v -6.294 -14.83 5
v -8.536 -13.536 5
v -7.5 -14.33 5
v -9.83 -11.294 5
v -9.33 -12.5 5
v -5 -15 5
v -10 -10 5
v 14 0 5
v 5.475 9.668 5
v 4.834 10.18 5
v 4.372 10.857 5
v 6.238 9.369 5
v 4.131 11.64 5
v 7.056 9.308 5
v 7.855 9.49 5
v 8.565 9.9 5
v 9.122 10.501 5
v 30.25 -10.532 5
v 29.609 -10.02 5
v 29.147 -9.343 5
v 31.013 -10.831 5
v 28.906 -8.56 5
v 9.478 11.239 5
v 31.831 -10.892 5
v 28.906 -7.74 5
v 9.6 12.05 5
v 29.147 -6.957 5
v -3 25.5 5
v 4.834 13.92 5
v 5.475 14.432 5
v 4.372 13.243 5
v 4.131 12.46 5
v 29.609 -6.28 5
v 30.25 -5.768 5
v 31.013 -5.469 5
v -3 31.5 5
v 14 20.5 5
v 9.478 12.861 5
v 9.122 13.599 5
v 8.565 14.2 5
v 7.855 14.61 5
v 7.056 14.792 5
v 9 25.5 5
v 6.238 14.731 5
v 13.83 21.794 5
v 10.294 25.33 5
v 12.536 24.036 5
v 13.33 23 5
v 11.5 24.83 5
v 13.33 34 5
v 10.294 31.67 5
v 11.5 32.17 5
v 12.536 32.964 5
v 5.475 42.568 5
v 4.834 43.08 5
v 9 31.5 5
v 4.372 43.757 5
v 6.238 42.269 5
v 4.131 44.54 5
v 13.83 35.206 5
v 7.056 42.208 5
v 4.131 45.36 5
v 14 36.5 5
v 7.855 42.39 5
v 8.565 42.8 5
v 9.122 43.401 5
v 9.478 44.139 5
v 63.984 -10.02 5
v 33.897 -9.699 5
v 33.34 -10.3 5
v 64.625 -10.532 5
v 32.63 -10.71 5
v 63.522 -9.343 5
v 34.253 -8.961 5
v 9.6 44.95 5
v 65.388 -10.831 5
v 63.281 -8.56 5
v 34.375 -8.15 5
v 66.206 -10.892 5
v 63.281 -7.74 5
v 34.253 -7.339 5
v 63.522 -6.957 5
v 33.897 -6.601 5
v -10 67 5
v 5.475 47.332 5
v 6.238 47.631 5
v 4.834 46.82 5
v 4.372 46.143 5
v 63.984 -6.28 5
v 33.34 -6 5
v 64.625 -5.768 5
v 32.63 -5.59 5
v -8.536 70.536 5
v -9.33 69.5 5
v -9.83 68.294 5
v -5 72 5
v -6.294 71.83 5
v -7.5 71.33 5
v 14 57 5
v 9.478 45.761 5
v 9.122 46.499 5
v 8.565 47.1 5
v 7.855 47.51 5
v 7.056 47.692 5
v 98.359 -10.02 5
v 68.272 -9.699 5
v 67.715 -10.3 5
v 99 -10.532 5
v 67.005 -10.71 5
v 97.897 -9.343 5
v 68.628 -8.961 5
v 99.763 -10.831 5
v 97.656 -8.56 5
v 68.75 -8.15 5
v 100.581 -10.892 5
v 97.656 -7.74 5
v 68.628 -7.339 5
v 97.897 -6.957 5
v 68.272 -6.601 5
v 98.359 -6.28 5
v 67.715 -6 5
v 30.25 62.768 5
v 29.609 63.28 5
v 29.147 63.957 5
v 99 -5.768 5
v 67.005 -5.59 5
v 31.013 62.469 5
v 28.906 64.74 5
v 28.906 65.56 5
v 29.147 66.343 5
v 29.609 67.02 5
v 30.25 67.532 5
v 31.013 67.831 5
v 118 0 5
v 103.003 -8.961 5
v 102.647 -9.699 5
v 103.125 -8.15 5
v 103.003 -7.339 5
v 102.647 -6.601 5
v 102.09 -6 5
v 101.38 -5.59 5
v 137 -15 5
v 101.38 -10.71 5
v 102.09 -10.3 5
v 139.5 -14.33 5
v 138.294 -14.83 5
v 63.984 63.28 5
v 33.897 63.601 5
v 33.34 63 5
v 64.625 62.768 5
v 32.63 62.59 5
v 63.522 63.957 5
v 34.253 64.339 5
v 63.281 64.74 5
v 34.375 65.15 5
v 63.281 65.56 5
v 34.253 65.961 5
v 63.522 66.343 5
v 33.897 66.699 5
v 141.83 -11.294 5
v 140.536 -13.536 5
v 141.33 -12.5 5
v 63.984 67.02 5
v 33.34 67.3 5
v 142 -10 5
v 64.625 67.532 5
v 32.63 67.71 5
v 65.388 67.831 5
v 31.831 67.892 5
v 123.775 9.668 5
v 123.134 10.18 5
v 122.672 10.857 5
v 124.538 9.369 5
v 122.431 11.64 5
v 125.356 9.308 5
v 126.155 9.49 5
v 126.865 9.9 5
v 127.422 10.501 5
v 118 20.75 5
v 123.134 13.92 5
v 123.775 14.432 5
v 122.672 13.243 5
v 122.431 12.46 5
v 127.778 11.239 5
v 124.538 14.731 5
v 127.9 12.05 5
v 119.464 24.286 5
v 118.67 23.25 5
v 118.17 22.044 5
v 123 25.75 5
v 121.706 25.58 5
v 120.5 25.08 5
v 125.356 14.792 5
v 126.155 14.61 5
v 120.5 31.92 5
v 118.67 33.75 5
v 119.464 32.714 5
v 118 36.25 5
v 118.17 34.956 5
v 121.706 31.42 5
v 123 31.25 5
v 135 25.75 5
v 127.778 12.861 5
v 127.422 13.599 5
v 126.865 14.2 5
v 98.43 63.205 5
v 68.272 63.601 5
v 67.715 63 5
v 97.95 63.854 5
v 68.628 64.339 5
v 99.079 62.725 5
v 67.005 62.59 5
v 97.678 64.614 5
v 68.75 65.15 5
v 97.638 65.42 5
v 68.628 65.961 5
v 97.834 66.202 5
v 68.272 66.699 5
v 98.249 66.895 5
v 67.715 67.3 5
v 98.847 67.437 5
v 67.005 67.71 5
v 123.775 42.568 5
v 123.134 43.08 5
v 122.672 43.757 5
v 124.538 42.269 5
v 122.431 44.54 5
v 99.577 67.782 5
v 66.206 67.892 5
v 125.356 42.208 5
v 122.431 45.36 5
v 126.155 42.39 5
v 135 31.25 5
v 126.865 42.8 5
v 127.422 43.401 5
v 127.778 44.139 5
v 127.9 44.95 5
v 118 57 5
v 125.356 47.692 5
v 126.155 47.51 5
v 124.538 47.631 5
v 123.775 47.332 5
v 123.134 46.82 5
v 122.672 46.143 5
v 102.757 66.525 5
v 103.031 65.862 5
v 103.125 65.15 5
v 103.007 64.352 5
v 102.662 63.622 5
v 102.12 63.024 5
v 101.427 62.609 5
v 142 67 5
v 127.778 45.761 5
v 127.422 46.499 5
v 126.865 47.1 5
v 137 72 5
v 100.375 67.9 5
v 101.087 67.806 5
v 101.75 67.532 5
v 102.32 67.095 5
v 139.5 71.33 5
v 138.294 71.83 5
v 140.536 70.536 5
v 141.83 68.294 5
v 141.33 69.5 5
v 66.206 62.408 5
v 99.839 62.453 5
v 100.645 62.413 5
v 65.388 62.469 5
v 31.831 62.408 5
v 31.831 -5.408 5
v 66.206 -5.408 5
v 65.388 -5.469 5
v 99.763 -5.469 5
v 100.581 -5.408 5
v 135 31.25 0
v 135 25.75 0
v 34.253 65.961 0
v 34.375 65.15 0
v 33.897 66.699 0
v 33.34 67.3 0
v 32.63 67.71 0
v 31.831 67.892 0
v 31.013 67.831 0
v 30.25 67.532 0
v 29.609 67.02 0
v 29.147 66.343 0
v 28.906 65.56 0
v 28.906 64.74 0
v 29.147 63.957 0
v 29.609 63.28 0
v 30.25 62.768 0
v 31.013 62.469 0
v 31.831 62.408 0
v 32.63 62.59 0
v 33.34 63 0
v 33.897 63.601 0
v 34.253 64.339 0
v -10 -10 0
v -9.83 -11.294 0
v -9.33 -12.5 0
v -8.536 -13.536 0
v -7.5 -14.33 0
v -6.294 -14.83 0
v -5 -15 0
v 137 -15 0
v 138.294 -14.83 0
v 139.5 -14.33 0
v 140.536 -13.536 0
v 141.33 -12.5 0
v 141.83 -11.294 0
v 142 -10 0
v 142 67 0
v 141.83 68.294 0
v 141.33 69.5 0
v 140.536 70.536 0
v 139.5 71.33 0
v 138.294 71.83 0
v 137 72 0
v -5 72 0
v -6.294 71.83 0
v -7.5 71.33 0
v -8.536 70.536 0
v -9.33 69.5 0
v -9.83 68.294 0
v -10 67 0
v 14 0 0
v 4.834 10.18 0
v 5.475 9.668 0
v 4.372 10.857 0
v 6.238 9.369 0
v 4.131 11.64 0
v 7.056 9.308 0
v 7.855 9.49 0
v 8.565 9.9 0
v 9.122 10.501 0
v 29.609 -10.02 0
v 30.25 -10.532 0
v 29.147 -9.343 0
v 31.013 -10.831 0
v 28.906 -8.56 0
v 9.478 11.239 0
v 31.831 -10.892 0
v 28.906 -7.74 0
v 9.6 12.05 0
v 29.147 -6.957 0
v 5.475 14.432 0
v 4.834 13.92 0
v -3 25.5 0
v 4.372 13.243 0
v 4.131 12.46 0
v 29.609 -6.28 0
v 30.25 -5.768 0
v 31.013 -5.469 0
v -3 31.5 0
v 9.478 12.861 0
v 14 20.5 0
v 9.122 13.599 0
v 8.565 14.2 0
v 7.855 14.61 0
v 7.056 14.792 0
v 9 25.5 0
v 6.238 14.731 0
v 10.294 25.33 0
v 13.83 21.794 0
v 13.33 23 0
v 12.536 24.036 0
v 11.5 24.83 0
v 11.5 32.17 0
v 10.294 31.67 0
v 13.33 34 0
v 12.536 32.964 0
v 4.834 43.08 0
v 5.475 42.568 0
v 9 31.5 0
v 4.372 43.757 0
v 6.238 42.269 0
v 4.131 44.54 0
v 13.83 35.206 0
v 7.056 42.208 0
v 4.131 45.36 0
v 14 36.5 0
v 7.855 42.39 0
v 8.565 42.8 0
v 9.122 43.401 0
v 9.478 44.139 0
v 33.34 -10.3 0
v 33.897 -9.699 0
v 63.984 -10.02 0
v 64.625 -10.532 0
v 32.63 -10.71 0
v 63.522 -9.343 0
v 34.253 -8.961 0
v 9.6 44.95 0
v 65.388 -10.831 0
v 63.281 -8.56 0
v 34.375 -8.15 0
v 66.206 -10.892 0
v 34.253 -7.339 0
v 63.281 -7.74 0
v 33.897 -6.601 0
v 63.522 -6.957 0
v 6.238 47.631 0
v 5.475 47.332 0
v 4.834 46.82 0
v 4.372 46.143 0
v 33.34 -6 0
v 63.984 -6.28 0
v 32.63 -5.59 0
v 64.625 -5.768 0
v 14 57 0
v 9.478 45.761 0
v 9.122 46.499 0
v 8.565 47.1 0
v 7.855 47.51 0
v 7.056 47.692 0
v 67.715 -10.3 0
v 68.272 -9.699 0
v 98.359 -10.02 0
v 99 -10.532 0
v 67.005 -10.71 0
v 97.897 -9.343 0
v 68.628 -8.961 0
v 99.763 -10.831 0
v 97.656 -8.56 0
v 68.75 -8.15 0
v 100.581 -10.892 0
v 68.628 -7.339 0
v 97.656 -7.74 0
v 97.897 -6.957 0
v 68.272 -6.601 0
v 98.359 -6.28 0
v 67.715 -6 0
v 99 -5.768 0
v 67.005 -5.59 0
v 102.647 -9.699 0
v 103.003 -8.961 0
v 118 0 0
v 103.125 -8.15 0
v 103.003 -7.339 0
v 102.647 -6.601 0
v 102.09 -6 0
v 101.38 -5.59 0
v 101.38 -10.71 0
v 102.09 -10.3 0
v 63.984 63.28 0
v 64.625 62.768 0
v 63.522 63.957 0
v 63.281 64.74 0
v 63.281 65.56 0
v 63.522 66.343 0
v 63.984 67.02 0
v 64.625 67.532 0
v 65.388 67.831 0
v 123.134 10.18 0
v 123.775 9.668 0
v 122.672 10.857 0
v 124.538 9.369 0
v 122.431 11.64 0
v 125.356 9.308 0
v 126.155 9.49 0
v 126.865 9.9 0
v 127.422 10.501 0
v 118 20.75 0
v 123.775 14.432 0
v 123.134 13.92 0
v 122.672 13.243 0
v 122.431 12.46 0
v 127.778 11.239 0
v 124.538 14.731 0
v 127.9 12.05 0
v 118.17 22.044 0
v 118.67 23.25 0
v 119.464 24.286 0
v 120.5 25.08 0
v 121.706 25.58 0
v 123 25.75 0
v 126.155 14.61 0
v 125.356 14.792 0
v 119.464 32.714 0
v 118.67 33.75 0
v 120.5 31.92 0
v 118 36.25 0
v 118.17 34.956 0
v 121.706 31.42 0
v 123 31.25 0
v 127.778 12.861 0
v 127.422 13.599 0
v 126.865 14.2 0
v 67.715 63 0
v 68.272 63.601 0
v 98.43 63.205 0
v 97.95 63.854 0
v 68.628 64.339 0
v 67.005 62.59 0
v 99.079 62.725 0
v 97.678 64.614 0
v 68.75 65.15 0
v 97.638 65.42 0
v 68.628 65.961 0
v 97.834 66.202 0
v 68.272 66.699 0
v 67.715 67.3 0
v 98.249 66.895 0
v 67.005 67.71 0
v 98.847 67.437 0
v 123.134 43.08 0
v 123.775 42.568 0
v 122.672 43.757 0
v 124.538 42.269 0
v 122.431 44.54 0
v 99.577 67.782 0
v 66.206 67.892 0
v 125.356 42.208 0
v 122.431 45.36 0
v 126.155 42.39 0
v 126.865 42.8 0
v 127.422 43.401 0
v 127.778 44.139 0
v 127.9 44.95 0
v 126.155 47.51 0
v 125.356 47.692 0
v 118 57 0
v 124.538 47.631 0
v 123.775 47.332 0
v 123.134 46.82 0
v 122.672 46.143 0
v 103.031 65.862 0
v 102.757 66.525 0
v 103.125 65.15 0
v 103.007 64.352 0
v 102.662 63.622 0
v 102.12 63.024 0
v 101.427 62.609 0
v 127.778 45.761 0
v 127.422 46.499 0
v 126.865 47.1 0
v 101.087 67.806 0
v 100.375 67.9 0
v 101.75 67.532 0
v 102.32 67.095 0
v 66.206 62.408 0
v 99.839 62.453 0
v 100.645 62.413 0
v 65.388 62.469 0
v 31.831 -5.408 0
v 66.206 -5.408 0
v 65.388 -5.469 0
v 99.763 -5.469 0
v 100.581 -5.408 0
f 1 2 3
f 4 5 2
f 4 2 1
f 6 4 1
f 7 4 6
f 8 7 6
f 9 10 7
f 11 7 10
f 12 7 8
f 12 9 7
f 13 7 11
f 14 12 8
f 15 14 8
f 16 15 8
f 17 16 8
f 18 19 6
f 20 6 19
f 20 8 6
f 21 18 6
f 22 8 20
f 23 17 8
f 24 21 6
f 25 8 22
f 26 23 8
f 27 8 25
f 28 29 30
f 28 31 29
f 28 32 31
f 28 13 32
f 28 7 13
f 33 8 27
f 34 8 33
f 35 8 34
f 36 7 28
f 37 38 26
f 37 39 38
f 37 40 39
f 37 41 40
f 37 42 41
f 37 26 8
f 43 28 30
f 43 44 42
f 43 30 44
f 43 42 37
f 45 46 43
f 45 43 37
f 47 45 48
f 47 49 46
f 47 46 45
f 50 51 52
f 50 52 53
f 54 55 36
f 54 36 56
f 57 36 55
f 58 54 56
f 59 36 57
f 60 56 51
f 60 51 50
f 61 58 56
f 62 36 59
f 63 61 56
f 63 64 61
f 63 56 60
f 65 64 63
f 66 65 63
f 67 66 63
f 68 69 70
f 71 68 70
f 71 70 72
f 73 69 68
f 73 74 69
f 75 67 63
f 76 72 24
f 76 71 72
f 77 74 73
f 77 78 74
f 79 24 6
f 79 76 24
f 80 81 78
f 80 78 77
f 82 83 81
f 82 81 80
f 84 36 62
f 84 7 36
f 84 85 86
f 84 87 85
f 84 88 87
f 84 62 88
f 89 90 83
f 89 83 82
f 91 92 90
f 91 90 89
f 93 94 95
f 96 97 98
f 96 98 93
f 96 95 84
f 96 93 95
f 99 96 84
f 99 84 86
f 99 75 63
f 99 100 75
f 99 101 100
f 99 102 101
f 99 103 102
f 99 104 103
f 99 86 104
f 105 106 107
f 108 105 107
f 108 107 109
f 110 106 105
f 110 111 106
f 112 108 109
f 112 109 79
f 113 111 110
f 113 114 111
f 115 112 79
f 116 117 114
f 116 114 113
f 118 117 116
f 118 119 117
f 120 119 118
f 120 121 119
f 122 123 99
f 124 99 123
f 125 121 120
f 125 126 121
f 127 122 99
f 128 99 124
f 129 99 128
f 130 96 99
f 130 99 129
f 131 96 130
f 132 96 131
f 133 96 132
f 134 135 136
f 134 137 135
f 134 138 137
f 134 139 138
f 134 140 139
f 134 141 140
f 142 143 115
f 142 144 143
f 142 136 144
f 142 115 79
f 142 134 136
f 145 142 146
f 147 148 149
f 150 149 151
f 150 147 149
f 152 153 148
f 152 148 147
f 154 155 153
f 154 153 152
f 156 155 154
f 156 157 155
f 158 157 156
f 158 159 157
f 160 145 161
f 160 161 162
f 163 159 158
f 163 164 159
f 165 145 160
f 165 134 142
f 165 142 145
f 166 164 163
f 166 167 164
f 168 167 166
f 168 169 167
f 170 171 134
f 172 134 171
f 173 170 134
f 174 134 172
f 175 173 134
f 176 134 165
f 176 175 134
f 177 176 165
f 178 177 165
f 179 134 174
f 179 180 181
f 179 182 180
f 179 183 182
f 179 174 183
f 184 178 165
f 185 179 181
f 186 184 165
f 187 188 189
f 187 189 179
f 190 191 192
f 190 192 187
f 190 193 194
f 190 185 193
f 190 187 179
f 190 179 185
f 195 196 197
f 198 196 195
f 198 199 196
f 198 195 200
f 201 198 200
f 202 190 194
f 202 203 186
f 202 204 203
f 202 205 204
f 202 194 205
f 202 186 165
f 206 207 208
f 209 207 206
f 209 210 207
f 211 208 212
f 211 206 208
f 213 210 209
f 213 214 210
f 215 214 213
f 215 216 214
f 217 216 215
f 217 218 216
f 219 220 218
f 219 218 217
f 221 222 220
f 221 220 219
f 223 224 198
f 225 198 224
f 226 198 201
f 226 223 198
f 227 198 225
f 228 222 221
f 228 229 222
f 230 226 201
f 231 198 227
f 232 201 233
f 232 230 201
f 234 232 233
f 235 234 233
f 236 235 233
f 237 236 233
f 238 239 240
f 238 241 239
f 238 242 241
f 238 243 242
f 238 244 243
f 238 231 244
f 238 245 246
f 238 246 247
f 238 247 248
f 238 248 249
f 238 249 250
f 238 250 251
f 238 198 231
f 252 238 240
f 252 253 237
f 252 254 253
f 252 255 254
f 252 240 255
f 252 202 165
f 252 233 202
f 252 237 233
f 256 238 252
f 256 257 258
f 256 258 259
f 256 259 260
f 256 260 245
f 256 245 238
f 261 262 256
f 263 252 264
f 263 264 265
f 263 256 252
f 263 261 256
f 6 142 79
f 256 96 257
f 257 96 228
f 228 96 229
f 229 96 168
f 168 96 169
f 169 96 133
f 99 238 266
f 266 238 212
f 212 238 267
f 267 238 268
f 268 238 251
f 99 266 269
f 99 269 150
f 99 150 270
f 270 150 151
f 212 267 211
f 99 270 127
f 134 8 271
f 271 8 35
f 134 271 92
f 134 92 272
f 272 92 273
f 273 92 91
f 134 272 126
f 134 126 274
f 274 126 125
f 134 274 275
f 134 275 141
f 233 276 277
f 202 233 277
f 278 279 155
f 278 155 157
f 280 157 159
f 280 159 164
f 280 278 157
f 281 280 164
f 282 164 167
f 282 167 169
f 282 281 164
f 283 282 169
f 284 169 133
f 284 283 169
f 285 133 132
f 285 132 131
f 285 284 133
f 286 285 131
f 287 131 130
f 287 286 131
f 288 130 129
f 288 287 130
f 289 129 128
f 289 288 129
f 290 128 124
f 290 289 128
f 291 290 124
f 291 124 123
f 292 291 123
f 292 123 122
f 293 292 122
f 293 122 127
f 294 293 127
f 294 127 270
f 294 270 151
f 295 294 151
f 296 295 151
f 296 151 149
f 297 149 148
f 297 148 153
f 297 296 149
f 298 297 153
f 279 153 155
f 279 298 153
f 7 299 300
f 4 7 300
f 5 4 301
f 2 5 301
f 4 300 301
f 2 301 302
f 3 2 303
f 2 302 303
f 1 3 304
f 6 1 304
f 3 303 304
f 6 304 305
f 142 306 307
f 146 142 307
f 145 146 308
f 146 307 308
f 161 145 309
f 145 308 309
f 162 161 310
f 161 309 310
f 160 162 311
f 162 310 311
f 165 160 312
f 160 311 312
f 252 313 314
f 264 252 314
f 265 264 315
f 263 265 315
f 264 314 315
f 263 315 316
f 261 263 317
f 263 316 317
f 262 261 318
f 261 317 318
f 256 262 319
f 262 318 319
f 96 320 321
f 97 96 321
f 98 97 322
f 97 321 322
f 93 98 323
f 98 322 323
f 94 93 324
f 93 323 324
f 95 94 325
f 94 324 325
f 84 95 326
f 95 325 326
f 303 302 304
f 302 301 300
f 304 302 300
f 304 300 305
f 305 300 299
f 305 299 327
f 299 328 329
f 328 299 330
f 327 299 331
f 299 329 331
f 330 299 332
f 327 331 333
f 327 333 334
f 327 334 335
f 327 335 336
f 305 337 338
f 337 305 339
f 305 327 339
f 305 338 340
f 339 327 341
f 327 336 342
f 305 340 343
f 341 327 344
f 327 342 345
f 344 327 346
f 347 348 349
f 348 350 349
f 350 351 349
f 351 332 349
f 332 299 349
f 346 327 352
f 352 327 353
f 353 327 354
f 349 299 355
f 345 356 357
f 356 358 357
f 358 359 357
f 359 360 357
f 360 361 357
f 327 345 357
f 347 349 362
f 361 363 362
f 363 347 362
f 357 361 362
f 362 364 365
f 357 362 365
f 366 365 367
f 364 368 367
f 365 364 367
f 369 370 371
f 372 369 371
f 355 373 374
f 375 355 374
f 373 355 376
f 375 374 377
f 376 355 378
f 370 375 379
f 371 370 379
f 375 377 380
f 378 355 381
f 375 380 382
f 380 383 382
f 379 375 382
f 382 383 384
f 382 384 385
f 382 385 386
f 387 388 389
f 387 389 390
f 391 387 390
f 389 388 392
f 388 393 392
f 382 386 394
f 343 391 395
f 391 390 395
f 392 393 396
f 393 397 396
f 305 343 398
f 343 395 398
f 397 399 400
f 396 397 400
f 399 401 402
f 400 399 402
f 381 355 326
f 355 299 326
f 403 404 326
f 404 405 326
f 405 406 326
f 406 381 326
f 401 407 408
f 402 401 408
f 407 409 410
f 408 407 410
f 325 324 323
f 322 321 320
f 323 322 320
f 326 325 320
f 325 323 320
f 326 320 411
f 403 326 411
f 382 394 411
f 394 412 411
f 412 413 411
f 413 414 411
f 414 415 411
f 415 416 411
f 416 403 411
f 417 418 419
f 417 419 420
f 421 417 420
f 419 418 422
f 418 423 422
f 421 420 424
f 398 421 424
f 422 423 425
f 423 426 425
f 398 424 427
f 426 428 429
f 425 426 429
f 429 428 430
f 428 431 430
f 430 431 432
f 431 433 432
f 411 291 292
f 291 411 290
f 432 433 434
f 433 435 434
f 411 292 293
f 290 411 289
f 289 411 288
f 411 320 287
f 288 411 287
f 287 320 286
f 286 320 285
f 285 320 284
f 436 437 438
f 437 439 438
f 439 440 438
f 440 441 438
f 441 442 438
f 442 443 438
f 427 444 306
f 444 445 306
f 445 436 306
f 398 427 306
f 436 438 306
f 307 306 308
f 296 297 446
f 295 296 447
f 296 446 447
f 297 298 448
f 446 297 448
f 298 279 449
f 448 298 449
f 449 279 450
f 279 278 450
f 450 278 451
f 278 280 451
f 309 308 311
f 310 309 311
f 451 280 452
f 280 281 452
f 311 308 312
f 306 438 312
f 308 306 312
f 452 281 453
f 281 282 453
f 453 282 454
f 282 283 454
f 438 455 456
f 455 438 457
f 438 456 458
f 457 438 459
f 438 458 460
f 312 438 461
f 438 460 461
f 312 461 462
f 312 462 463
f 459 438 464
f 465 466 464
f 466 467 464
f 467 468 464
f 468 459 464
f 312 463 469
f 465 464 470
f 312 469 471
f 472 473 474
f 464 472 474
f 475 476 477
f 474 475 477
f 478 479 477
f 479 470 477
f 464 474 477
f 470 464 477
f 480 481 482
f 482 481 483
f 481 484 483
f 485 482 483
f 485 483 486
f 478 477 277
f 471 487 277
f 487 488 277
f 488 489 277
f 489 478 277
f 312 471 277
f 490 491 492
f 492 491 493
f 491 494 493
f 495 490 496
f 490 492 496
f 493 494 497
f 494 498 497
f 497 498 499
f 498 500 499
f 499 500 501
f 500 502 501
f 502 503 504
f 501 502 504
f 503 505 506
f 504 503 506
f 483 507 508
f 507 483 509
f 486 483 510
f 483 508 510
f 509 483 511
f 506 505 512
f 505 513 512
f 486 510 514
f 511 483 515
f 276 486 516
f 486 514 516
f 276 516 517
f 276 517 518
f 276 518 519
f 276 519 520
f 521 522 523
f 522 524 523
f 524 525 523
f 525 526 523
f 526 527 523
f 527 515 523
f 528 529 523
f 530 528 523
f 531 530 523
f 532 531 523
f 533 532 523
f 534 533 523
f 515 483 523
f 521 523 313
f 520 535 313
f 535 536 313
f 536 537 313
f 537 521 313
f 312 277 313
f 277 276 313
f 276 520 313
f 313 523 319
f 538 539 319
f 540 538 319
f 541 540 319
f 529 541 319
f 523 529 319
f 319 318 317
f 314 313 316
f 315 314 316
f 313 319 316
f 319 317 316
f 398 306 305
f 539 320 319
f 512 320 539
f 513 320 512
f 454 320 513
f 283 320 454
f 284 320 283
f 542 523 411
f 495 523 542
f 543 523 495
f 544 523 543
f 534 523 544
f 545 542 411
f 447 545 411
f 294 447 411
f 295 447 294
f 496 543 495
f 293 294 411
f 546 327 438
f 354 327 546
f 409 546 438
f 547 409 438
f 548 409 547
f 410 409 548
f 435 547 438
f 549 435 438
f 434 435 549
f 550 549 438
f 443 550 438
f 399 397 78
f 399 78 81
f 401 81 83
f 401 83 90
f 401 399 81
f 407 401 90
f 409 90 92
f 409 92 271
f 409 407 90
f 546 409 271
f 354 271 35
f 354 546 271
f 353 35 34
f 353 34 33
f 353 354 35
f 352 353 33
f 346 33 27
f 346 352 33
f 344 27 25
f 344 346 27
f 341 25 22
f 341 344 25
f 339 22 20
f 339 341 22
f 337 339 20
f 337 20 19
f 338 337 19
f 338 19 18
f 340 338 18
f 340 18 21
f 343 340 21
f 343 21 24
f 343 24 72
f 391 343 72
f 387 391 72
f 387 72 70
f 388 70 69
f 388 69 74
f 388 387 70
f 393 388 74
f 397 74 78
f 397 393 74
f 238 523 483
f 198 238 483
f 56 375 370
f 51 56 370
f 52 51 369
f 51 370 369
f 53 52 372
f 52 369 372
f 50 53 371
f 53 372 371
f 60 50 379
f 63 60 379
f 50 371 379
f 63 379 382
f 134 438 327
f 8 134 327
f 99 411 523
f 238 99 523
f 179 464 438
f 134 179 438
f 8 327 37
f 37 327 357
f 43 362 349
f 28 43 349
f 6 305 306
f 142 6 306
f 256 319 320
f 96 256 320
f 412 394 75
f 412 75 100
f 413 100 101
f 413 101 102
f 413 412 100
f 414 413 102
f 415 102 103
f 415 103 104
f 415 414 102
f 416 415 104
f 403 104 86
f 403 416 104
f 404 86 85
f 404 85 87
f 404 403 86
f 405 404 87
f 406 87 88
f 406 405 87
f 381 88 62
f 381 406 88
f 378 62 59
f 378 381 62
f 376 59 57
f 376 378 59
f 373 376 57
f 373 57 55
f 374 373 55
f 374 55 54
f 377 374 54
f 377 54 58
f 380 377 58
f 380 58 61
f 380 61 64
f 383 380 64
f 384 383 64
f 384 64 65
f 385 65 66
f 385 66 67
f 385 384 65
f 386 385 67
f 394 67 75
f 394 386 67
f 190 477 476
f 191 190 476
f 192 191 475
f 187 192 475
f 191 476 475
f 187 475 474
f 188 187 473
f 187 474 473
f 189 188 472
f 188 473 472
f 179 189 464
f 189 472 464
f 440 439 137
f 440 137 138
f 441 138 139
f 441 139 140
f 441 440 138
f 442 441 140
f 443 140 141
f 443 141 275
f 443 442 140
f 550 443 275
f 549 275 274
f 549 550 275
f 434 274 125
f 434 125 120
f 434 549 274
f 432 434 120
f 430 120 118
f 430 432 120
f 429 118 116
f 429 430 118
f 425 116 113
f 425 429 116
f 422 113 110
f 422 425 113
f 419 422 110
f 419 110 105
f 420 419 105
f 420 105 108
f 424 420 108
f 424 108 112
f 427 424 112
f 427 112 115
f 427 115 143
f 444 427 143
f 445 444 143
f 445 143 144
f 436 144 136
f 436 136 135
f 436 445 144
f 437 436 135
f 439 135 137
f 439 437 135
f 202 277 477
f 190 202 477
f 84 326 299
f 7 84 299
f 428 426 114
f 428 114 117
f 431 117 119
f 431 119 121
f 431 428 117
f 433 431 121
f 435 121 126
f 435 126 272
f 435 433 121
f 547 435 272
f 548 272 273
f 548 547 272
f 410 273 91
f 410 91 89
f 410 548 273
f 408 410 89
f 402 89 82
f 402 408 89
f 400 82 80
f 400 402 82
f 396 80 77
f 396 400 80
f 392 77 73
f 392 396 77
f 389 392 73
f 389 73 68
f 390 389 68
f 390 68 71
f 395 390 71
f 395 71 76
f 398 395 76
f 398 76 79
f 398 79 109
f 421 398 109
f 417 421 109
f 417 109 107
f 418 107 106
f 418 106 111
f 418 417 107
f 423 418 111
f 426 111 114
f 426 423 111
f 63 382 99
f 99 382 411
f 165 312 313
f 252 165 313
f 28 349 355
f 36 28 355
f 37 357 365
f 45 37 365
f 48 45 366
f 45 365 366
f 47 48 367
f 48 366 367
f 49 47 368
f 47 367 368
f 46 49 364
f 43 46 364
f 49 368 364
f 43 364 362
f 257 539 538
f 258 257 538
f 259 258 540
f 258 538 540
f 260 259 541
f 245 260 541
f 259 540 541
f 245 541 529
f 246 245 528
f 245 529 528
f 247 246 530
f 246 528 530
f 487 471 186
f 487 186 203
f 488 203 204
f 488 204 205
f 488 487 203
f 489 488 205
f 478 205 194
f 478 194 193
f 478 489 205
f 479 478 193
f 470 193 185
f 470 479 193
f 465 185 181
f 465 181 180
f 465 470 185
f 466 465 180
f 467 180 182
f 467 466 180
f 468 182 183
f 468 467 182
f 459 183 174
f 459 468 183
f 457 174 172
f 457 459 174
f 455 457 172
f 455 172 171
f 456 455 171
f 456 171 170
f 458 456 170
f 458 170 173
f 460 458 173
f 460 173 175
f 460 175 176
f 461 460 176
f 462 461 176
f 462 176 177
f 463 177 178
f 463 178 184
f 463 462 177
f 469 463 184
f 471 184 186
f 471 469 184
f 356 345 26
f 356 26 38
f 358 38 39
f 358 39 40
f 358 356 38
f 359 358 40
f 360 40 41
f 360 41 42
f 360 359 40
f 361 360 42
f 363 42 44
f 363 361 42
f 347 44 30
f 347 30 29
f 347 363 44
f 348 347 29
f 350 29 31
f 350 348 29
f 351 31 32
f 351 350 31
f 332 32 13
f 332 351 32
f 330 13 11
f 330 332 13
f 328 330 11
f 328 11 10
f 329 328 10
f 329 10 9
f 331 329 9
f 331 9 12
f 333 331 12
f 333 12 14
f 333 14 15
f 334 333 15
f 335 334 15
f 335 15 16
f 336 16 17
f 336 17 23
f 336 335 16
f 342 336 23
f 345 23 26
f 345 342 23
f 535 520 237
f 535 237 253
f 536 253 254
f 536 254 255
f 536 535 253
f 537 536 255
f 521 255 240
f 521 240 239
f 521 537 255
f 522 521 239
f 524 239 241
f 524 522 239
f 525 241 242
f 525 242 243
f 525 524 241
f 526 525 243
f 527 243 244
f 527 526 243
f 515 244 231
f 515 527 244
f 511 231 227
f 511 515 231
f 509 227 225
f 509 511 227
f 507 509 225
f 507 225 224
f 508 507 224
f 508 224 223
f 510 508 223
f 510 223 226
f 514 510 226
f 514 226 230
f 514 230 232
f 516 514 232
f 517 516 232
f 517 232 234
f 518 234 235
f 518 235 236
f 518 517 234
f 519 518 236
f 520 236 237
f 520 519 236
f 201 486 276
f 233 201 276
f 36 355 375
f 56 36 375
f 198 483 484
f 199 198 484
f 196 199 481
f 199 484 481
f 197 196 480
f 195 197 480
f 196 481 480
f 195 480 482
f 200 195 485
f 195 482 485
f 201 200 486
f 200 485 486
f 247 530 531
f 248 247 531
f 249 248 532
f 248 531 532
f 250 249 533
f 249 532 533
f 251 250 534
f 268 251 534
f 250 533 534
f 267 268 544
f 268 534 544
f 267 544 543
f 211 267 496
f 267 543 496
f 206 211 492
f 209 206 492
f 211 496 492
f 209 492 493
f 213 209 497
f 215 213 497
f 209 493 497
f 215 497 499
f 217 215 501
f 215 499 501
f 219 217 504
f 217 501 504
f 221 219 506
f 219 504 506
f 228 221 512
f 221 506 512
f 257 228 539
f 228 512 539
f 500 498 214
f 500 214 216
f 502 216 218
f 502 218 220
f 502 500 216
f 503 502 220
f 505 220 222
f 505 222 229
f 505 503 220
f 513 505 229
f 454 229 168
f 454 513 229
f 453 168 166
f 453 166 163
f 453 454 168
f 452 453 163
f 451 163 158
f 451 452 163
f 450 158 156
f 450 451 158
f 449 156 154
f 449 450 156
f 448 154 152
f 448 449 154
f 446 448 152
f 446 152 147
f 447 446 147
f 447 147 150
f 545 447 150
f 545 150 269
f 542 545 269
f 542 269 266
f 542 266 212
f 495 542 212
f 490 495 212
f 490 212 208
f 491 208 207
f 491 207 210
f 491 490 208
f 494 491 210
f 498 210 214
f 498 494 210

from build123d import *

# Parameters (mm, degrees)
F0_R     = 2.75
F1_DEPTH = 5


with BuildPart() as f1:
    # F0 (on Top) → F1 (new body)
    with BuildSketch(Plane.XY):
        with BuildLine():
            Line((0, 25.5), (0, 0))
            Line((0, 0), (14, 0))
            Line((14, 0), (14, 20.5))
            ThreePointArc((14, 20.5), (12.5355339059, 24.0355339059), (9, 25.5))
            Line((9, 25.5), (0, 25.5))
        make_face()
        with Locations((6.85, 12.05)):
            Circle(F0_R, mode=Mode.SUBTRACT)
        with BuildLine():
            Line((14, 0), (0, 0))
            Line((0, 0), (-10, 0))
            Line((-10, 0), (-10, -10))
            ThreePointArc((-10, -10), (-8.5355339059, -13.5355339059), (-5, -15))
            Line((-5, -15), (0, -15))
            Line((0, -15), (132, -15))
            Line((132, -15), (132, 0))
            Line((132, 0), (118, 0))
            Line((118, 0), (14, 0))
        make_face()
        with Locations((31.625, -8.15)):
            Circle(F0_R, mode=Mode.SUBTRACT)
        with Locations((66, -8.15)):
            Circle(F0_R, mode=Mode.SUBTRACT)
        with Locations((100.375, -8.15)):
            Circle(F0_R, mode=Mode.SUBTRACT)
        Polygon((-10, 0), (0, 0), (0, 25.5), (-3, 25.5), (-3, 28.5), (-3, 31.5), (0, 31.5), (0, 57), (-10, 57), align=None)
        with BuildLine():
            Line((118, 20.75), (118, 0))
            Line((118, 0), (132, 0))
            Line((132, 0), (132, 25.75))
            Line((132, 25.75), (123, 25.75))
            ThreePointArc((123, 25.75), (119.4644660941, 24.2855339059), (118, 20.75))
        make_face()
        with Locations((125.15, 12.05)):
            Circle(F0_R, mode=Mode.SUBTRACT)
        with BuildLine():
            Line((-10, 67), (-10, 57))
            Line((-10, 57), (0, 57))
            Line((0, 57), (0, 72))
            Line((0, 72), (-5, 72))
            ThreePointArc((-5, 72), (-8.5355339059, 70.5355339059), (-10, 67))
        make_face()
        with BuildLine():
            Line((0, 57), (0, 31.5))
            Line((0, 31.5), (9, 31.5))
            ThreePointArc((9, 31.5), (12.5355339059, 32.9644660941), (14, 36.5))
            Line((14, 36.5), (14, 57))
            Line((14, 57), (0, 57))
        make_face()
        with Locations((6.85, 44.95)):
            Circle(F0_R, mode=Mode.SUBTRACT)
        with BuildLine():
            Line((142, 0), (132, 0))
            Line((132, 0), (132, -15))
            Line((132, -15), (137, -15))
            ThreePointArc((137, -15), (140.5355339059, -13.5355339059), (142, -10))
            Line((142, -10), (142, 0))
        make_face()
        Polygon((132, 25.75), (132, 0), (142, 0), (142, 57), (132, 57), (132, 31.25), (135, 31.25), (135, 28.25), (135, 25.75), align=None)
        Polygon((0, 72), (0, 57), (14, 57), (118, 57), (132, 57), (132, 72), (100.375, 72), align=None)
        with Locations((31.625, 65.15)):
            Circle(F0_R, mode=Mode.SUBTRACT)
        with Locations((66, 65.15)):
            Circle(F0_R, mode=Mode.SUBTRACT)
        with BuildLine():
            ThreePointArc((103.125, 65.15), (98.4304563517, 63.2054563517), (100.375, 67.9))
            ThreePointArc((100.375, 67.9), (102.3195436483, 67.0945436483), (103.125, 65.15))
        make_face(mode=Mode.SUBTRACT)
        with BuildLine():
            Line((123, 31.25), (132, 31.25))
            Line((132, 31.25), (132, 57))
            Line((132, 57), (118, 57))
            Line((118, 57), (118, 36.25))
            ThreePointArc((118, 36.25), (119.4644660941, 32.7144660941), (123, 31.25))
        make_face()
        with Locations((125.15, 44.95)):
            Circle(F0_R, mode=Mode.SUBTRACT)
        with BuildLine():
            Line((132, 57), (142, 57))
            Line((142, 57), (142, 67))
            ThreePointArc((142, 67), (140.5355339059, 70.5355339059), (137, 72))
            Line((137, 72), (132, 72))
            Line((132, 72), (132, 57))
        make_face()
    extrude(amount=F1_DEPTH)


solid = f1.part
